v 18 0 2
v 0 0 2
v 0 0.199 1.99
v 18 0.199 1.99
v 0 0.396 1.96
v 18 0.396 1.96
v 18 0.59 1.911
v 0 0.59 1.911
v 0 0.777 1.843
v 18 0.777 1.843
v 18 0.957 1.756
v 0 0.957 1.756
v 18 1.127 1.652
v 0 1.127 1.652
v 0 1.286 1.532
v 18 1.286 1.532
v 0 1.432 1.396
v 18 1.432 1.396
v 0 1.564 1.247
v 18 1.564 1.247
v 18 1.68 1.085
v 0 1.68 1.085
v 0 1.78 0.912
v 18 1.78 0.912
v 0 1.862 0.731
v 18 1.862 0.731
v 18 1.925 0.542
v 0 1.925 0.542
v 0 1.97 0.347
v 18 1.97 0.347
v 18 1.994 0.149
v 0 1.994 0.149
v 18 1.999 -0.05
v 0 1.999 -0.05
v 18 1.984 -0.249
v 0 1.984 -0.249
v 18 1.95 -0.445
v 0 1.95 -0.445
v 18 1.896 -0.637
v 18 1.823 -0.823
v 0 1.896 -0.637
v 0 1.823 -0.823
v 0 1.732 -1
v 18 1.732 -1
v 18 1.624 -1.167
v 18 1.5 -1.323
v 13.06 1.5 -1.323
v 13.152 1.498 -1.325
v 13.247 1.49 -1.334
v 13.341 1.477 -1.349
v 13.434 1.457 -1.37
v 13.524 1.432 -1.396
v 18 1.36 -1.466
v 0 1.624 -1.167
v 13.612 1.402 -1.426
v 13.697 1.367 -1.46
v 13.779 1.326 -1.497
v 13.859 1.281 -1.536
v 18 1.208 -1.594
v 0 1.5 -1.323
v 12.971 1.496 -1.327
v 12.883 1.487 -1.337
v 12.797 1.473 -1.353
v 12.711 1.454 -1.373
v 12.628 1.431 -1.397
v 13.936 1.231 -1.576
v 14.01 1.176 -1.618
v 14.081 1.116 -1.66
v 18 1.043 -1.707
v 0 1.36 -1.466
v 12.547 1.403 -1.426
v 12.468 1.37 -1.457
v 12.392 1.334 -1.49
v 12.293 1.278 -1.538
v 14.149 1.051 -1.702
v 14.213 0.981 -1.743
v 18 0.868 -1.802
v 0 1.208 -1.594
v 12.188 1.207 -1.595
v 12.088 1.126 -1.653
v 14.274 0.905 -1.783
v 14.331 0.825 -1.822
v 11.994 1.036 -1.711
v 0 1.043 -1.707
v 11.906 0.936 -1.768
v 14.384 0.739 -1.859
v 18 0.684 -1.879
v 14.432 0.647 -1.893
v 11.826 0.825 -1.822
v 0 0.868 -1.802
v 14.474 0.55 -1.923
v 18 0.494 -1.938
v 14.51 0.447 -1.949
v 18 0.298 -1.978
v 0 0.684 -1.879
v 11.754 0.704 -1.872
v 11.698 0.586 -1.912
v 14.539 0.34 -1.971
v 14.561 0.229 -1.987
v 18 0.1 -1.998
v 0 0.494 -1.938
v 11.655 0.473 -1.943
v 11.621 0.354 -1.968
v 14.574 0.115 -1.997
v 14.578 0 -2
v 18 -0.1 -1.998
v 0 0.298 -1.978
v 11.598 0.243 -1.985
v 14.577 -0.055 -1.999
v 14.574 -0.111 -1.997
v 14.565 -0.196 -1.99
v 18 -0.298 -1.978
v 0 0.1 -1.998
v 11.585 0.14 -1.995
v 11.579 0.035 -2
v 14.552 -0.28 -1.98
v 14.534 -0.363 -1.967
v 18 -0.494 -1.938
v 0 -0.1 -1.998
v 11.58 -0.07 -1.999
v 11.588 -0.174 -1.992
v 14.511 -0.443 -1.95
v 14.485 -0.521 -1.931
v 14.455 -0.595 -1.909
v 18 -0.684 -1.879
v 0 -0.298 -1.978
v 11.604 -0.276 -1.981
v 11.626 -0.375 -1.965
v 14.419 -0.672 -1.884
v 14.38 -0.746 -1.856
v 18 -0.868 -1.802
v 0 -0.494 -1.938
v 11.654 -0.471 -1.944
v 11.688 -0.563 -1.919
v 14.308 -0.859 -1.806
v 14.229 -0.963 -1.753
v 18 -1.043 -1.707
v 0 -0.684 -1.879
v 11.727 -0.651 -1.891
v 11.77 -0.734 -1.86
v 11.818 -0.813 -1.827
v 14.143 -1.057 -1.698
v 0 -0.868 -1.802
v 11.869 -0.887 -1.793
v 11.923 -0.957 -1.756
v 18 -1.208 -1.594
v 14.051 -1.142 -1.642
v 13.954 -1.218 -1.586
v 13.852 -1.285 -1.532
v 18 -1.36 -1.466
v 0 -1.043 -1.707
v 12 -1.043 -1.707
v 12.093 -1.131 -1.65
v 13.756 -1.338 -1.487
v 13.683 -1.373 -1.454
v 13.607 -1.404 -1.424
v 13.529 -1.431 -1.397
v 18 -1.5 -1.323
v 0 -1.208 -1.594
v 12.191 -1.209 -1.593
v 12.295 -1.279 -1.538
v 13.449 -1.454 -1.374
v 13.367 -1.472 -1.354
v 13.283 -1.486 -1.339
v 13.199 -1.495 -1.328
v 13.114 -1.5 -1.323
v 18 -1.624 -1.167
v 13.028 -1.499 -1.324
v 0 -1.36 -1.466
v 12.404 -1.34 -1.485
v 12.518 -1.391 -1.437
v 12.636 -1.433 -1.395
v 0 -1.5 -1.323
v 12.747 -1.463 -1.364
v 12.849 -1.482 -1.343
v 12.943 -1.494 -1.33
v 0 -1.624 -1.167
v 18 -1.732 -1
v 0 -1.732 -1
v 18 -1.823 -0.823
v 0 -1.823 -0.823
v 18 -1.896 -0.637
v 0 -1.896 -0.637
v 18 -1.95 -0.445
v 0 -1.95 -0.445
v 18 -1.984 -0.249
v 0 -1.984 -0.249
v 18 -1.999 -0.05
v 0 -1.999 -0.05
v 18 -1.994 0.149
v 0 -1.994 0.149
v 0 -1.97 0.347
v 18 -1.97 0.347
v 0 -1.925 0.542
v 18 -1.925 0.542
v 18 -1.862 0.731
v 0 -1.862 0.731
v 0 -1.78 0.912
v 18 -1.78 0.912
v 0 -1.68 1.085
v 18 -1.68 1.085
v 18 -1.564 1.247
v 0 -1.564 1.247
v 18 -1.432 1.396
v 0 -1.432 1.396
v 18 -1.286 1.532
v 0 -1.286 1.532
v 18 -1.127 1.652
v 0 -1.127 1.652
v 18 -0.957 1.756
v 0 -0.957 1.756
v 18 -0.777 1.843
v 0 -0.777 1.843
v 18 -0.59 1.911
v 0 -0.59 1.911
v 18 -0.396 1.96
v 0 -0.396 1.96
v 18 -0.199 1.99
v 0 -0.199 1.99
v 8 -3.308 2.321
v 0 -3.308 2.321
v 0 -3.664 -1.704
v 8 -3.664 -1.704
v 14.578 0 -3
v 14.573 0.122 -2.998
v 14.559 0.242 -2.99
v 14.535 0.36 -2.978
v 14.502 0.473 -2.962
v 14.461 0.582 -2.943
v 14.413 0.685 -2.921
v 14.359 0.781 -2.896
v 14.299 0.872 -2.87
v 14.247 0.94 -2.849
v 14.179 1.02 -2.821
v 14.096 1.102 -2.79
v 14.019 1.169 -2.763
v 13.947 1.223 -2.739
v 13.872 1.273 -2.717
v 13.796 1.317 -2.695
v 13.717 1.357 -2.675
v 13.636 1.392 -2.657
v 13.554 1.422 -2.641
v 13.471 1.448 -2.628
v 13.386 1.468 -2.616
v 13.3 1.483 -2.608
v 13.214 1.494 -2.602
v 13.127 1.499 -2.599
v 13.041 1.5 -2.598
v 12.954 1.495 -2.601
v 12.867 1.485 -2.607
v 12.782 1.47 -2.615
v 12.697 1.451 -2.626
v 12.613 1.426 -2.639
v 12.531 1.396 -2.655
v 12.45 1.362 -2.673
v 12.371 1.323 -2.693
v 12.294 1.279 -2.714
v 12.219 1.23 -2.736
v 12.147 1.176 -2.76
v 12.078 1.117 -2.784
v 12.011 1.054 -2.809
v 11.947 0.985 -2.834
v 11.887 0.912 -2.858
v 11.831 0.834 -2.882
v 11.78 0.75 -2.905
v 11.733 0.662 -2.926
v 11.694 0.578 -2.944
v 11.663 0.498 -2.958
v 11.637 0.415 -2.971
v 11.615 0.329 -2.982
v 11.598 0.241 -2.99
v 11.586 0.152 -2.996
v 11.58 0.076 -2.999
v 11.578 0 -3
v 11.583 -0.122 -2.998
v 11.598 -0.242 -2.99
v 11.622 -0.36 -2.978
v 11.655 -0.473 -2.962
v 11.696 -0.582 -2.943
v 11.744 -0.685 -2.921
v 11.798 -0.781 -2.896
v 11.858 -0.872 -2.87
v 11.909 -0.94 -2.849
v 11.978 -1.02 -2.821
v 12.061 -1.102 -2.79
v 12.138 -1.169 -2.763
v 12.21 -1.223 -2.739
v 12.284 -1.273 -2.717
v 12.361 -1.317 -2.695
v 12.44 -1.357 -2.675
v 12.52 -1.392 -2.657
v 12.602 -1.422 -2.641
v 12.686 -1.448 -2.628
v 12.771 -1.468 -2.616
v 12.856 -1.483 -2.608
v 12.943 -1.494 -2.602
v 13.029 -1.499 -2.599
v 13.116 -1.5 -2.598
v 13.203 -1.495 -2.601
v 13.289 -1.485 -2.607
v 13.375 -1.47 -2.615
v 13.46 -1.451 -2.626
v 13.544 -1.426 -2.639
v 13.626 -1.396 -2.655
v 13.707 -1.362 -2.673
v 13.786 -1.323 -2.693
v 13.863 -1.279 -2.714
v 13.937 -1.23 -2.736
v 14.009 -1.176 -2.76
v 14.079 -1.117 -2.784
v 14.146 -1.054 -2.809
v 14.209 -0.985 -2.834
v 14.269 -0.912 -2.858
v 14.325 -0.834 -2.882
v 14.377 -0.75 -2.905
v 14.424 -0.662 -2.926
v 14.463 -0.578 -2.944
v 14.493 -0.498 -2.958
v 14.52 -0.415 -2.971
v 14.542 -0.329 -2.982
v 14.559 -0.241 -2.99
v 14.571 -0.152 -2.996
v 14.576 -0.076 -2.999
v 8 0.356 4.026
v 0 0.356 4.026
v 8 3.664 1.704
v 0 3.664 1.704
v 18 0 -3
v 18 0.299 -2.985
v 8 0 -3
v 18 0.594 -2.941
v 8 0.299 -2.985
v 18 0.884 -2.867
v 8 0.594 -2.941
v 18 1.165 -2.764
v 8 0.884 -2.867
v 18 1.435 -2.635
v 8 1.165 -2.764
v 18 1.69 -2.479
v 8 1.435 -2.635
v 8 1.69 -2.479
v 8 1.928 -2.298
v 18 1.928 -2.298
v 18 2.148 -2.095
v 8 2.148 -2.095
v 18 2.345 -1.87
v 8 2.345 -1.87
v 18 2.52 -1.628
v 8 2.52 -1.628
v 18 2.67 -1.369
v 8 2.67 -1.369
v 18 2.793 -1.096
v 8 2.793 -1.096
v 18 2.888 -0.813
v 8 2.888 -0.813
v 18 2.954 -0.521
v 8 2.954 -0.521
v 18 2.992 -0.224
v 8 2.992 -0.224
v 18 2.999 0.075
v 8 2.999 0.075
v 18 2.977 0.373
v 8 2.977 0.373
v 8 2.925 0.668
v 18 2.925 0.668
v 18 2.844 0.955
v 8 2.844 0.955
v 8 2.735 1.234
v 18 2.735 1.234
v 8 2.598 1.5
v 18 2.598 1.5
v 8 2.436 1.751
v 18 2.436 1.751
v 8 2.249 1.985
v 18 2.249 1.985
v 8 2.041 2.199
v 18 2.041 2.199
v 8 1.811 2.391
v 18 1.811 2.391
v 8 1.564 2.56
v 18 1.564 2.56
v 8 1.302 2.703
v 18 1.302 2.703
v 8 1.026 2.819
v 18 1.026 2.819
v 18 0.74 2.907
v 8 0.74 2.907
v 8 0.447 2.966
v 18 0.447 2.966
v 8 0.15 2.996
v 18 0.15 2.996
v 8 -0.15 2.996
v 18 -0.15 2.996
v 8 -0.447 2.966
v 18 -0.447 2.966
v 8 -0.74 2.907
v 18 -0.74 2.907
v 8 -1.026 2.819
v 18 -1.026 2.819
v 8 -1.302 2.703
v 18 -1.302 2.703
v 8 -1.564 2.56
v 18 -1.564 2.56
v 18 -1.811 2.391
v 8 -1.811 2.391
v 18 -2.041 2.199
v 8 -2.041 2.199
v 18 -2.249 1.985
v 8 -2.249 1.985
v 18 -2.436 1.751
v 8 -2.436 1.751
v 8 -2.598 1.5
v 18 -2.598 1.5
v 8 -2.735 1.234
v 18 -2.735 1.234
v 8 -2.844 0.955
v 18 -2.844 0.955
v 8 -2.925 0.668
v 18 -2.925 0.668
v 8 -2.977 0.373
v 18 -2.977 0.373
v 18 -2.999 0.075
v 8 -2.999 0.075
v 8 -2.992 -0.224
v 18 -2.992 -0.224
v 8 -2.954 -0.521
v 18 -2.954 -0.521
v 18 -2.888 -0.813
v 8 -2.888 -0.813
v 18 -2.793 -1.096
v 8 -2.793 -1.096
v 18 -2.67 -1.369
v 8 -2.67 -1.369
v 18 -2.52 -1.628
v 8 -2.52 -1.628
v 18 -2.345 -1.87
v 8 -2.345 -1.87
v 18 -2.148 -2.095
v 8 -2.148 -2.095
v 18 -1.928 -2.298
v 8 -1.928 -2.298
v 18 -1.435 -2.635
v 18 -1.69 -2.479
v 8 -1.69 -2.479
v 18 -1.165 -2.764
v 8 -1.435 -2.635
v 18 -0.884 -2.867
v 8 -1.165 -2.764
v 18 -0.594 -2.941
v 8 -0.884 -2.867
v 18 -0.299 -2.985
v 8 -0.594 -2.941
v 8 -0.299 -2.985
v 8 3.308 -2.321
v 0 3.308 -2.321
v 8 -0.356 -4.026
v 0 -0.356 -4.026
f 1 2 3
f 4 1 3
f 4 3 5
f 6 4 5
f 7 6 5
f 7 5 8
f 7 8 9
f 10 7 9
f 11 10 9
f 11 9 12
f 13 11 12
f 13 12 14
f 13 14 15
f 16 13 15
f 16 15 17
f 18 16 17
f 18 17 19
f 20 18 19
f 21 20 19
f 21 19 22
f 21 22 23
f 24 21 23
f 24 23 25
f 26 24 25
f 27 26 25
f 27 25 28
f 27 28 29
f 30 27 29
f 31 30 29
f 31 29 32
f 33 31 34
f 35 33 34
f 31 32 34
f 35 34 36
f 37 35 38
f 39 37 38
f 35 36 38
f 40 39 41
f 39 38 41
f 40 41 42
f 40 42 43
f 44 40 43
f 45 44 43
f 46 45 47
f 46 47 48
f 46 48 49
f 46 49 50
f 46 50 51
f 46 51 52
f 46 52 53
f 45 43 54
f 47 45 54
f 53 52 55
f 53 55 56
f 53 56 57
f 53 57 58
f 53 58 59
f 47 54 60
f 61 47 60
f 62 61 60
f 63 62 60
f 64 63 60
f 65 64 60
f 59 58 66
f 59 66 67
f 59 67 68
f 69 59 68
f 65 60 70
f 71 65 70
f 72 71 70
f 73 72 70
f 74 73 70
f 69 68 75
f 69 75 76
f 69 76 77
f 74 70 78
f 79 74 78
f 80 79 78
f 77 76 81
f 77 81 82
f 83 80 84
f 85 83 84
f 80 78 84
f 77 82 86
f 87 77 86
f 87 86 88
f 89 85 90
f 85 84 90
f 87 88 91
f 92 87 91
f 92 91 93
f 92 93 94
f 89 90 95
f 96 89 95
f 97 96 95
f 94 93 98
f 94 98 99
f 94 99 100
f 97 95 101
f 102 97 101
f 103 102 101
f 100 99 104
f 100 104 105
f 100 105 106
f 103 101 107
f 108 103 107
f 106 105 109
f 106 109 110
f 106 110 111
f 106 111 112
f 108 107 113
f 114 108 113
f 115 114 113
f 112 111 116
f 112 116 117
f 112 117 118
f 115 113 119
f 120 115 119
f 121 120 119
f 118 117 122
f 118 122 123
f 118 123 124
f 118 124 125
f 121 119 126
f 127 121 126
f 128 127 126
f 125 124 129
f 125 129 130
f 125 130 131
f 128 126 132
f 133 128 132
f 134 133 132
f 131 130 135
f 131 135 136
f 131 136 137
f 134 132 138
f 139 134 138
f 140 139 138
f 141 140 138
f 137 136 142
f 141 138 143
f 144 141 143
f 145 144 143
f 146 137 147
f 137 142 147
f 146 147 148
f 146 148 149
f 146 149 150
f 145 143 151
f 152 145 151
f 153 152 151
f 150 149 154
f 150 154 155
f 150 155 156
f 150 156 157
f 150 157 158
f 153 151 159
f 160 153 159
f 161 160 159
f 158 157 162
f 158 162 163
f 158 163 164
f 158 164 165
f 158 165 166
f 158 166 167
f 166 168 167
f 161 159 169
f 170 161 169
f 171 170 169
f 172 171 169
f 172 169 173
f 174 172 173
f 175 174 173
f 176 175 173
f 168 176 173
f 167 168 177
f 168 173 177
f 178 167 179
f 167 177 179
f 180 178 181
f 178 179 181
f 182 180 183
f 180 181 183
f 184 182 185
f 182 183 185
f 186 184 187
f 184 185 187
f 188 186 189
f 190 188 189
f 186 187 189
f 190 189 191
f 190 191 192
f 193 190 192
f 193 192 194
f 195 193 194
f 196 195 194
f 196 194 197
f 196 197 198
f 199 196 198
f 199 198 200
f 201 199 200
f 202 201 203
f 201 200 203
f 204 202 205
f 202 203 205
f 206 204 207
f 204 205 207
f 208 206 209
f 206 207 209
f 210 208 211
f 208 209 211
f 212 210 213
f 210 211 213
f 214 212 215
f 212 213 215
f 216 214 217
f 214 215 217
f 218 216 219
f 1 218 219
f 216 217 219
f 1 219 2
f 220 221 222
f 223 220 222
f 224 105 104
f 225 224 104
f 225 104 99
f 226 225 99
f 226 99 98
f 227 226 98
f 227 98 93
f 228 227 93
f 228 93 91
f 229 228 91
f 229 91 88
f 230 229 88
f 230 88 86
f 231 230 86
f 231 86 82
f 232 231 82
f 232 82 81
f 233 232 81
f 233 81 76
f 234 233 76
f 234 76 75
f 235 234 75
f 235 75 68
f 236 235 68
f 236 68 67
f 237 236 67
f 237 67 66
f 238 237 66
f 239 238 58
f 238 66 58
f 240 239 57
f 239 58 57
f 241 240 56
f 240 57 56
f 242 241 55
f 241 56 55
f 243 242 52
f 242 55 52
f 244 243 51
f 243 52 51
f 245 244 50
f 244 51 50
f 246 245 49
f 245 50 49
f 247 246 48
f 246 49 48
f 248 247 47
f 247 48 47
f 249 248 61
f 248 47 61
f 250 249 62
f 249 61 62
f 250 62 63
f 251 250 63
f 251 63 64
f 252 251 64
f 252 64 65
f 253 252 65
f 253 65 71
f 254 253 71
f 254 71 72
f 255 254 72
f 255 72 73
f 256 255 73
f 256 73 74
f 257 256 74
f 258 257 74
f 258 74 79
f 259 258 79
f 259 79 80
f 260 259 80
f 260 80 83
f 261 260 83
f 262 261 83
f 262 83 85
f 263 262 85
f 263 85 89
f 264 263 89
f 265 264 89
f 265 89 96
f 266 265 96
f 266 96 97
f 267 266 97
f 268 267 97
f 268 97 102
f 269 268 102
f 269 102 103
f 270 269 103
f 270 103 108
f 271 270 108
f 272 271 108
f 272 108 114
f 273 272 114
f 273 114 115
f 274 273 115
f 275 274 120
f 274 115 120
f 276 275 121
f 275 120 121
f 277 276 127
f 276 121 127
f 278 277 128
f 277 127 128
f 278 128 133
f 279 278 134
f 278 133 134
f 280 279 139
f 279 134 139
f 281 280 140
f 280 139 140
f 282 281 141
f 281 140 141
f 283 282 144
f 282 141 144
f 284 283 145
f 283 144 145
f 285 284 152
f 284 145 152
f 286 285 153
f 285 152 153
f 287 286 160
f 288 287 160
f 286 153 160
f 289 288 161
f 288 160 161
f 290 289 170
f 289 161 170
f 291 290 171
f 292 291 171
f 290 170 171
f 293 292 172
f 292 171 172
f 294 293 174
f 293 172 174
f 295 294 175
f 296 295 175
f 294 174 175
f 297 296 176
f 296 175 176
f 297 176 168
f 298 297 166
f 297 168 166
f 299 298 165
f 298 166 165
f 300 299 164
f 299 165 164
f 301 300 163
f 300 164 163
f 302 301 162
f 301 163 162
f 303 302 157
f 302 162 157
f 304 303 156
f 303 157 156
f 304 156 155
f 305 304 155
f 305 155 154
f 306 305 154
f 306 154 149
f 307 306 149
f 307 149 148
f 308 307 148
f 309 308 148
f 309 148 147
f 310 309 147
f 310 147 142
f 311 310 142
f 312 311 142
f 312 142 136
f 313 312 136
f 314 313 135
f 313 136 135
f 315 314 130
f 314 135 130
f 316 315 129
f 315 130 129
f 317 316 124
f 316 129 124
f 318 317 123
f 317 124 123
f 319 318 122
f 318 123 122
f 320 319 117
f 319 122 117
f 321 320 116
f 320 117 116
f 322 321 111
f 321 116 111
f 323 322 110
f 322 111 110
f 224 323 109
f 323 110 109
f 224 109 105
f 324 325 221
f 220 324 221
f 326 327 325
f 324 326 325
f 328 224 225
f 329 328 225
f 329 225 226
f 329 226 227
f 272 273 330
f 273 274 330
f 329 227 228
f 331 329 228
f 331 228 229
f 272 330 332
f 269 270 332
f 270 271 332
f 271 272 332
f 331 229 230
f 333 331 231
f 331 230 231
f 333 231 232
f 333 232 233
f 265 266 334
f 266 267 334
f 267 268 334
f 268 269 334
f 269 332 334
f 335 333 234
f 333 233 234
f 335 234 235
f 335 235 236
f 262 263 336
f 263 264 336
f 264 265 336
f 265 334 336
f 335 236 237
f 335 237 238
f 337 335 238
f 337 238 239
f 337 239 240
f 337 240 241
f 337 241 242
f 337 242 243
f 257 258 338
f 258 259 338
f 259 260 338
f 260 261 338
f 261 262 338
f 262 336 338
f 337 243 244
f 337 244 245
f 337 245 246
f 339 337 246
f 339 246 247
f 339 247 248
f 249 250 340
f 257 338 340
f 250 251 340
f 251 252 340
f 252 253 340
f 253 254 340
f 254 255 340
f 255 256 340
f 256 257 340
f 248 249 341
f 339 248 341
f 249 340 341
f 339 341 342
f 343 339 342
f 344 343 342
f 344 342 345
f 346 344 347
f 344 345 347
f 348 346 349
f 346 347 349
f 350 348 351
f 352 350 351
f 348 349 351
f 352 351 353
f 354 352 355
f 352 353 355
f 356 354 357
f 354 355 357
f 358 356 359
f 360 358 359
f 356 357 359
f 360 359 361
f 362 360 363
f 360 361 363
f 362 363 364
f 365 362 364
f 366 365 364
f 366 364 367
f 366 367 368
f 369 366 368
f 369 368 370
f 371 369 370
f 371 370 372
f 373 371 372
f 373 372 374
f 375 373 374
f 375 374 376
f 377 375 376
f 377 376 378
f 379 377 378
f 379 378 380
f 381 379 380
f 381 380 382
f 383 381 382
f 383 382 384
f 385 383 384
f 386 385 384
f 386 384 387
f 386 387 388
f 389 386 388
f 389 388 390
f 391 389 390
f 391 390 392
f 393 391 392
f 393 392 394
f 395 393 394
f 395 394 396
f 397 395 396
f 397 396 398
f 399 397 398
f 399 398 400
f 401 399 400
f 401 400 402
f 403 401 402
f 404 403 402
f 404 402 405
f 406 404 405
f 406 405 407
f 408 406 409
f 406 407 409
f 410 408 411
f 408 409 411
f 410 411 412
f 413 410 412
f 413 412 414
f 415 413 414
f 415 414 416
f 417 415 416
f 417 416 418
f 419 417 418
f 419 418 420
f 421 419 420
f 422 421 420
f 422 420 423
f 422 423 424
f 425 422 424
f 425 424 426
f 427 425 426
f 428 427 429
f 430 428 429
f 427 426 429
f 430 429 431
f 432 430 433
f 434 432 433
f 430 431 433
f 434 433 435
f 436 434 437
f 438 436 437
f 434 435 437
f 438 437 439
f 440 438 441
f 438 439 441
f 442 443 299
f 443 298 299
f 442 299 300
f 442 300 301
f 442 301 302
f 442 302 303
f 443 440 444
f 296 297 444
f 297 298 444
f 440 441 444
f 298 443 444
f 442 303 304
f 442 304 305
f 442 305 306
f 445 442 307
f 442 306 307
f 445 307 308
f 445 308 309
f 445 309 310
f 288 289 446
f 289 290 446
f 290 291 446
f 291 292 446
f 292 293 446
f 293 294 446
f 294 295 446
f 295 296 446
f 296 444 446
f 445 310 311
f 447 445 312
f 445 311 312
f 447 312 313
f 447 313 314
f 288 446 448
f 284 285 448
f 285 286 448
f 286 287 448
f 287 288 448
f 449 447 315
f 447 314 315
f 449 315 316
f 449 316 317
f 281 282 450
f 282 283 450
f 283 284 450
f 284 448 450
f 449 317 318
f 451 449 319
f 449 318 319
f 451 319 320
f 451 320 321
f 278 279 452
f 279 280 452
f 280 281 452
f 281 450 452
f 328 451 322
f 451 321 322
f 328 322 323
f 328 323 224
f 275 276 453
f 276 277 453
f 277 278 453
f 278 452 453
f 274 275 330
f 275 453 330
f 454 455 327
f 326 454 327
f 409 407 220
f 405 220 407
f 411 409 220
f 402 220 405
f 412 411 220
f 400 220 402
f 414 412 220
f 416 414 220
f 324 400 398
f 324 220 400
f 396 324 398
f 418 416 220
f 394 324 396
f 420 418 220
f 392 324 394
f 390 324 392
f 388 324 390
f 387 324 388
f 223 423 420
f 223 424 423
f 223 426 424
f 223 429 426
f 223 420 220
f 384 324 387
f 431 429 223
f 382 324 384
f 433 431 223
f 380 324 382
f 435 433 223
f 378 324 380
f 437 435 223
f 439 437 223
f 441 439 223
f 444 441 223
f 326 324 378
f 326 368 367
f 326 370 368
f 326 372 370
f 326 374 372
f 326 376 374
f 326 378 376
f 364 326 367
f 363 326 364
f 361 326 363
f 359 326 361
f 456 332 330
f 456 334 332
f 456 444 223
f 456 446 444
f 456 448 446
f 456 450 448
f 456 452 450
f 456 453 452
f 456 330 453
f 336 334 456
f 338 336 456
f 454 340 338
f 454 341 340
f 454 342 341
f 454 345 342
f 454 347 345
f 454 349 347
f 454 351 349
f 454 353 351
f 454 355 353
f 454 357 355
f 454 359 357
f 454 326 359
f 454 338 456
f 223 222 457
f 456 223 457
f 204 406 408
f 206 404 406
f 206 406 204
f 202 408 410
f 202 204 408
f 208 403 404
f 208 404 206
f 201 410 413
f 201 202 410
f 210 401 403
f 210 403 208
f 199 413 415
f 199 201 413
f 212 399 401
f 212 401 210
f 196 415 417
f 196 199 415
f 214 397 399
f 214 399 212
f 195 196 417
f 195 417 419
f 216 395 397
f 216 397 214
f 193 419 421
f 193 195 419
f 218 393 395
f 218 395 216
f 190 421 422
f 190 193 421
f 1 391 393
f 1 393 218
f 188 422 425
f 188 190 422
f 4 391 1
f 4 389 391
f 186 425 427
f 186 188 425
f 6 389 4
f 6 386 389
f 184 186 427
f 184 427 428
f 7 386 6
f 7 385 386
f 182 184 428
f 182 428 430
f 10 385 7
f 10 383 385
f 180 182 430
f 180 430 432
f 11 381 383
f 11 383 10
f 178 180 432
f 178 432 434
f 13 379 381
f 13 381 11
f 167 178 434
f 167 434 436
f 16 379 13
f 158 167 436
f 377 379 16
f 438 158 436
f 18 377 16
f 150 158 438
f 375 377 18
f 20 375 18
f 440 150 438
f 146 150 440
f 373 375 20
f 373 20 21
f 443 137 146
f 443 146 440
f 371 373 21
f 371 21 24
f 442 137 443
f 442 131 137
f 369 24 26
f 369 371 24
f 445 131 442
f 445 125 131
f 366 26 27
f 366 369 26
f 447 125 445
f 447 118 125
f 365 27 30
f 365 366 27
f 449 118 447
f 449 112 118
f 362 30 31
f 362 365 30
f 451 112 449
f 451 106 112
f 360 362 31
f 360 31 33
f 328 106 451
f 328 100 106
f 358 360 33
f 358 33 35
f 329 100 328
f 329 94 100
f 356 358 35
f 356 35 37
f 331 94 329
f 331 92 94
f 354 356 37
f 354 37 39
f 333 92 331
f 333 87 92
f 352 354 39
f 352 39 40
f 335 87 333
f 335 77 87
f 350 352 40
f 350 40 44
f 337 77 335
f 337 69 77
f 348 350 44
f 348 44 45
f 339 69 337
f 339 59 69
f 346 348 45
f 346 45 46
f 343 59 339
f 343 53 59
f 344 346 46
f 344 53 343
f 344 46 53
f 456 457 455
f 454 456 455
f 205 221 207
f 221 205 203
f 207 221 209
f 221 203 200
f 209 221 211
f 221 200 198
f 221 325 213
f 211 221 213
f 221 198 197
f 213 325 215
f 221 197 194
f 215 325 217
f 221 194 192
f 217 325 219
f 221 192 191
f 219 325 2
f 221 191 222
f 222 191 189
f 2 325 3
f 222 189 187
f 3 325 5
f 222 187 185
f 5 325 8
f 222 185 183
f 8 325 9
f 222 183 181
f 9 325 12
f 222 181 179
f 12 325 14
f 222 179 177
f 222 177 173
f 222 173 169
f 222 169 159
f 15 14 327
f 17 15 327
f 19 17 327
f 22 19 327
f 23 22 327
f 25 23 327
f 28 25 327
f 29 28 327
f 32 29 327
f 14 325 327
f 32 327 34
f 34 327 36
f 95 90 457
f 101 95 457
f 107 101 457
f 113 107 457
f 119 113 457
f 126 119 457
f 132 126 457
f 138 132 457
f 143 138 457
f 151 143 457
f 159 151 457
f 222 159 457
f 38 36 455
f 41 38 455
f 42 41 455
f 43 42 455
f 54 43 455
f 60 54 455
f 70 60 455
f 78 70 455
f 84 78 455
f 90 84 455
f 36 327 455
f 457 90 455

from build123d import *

# Parameters (mm, degrees)
EXTRUDE_1_DEPTH     = 8
SKETCH_2_R          = 3
EXTRUDE_2_DEPTH     = 10
SKETCH_3_R          = 2
CUT_EXTRUDE_1_DEPTH = 19.805177909
SKETCH_4_R          = 1.5
CUT_EXTRUDE_2_DEPTH = 10


with BuildPart() as part:
    # 草图1 → 凸台-拉伸1 (new body)
    with BuildSketch(Plane(origin=(0, 0, 0), x_dir=(0, 0, -1), z_dir=(1, 0, 0))):
        Polygon((1.704440109, -3.664453199), (4.025729616, -0.356138166), (2.321289507, 3.308315033), (-1.704440109, 3.664453199), (-4.025729616, 0.356138166), (-2.321289507, -3.308315033), align=None)
    extrude(amount=EXTRUDE_1_DEPTH)

    # 草图2 → 凸台-拉伸2 (add)
    with BuildSketch(Plane(origin=(8, 0, 0), x_dir=(0, 0, -1), z_dir=(1, 0, 0))):
        Circle(SKETCH_2_R)
    extrude(amount=EXTRUDE_2_DEPTH)

    # 草图3 → 切除-拉伸1 (cut, through all)
    with BuildSketch(Plane.ZY):
        Circle(SKETCH_3_R)
    extrude(amount=-CUT_EXTRUDE_1_DEPTH, mode=Mode.SUBTRACT)

    # 草图4 → 切除-拉伸2 (cut)
    with BuildSketch(Plane.XY):
        with Locations((13.078342884, 0)):
            Circle(SKETCH_4_R)
    extrude(amount=-CUT_EXTRUDE_2_DEPTH, mode=Mode.SUBTRACT)


solid = part.part
